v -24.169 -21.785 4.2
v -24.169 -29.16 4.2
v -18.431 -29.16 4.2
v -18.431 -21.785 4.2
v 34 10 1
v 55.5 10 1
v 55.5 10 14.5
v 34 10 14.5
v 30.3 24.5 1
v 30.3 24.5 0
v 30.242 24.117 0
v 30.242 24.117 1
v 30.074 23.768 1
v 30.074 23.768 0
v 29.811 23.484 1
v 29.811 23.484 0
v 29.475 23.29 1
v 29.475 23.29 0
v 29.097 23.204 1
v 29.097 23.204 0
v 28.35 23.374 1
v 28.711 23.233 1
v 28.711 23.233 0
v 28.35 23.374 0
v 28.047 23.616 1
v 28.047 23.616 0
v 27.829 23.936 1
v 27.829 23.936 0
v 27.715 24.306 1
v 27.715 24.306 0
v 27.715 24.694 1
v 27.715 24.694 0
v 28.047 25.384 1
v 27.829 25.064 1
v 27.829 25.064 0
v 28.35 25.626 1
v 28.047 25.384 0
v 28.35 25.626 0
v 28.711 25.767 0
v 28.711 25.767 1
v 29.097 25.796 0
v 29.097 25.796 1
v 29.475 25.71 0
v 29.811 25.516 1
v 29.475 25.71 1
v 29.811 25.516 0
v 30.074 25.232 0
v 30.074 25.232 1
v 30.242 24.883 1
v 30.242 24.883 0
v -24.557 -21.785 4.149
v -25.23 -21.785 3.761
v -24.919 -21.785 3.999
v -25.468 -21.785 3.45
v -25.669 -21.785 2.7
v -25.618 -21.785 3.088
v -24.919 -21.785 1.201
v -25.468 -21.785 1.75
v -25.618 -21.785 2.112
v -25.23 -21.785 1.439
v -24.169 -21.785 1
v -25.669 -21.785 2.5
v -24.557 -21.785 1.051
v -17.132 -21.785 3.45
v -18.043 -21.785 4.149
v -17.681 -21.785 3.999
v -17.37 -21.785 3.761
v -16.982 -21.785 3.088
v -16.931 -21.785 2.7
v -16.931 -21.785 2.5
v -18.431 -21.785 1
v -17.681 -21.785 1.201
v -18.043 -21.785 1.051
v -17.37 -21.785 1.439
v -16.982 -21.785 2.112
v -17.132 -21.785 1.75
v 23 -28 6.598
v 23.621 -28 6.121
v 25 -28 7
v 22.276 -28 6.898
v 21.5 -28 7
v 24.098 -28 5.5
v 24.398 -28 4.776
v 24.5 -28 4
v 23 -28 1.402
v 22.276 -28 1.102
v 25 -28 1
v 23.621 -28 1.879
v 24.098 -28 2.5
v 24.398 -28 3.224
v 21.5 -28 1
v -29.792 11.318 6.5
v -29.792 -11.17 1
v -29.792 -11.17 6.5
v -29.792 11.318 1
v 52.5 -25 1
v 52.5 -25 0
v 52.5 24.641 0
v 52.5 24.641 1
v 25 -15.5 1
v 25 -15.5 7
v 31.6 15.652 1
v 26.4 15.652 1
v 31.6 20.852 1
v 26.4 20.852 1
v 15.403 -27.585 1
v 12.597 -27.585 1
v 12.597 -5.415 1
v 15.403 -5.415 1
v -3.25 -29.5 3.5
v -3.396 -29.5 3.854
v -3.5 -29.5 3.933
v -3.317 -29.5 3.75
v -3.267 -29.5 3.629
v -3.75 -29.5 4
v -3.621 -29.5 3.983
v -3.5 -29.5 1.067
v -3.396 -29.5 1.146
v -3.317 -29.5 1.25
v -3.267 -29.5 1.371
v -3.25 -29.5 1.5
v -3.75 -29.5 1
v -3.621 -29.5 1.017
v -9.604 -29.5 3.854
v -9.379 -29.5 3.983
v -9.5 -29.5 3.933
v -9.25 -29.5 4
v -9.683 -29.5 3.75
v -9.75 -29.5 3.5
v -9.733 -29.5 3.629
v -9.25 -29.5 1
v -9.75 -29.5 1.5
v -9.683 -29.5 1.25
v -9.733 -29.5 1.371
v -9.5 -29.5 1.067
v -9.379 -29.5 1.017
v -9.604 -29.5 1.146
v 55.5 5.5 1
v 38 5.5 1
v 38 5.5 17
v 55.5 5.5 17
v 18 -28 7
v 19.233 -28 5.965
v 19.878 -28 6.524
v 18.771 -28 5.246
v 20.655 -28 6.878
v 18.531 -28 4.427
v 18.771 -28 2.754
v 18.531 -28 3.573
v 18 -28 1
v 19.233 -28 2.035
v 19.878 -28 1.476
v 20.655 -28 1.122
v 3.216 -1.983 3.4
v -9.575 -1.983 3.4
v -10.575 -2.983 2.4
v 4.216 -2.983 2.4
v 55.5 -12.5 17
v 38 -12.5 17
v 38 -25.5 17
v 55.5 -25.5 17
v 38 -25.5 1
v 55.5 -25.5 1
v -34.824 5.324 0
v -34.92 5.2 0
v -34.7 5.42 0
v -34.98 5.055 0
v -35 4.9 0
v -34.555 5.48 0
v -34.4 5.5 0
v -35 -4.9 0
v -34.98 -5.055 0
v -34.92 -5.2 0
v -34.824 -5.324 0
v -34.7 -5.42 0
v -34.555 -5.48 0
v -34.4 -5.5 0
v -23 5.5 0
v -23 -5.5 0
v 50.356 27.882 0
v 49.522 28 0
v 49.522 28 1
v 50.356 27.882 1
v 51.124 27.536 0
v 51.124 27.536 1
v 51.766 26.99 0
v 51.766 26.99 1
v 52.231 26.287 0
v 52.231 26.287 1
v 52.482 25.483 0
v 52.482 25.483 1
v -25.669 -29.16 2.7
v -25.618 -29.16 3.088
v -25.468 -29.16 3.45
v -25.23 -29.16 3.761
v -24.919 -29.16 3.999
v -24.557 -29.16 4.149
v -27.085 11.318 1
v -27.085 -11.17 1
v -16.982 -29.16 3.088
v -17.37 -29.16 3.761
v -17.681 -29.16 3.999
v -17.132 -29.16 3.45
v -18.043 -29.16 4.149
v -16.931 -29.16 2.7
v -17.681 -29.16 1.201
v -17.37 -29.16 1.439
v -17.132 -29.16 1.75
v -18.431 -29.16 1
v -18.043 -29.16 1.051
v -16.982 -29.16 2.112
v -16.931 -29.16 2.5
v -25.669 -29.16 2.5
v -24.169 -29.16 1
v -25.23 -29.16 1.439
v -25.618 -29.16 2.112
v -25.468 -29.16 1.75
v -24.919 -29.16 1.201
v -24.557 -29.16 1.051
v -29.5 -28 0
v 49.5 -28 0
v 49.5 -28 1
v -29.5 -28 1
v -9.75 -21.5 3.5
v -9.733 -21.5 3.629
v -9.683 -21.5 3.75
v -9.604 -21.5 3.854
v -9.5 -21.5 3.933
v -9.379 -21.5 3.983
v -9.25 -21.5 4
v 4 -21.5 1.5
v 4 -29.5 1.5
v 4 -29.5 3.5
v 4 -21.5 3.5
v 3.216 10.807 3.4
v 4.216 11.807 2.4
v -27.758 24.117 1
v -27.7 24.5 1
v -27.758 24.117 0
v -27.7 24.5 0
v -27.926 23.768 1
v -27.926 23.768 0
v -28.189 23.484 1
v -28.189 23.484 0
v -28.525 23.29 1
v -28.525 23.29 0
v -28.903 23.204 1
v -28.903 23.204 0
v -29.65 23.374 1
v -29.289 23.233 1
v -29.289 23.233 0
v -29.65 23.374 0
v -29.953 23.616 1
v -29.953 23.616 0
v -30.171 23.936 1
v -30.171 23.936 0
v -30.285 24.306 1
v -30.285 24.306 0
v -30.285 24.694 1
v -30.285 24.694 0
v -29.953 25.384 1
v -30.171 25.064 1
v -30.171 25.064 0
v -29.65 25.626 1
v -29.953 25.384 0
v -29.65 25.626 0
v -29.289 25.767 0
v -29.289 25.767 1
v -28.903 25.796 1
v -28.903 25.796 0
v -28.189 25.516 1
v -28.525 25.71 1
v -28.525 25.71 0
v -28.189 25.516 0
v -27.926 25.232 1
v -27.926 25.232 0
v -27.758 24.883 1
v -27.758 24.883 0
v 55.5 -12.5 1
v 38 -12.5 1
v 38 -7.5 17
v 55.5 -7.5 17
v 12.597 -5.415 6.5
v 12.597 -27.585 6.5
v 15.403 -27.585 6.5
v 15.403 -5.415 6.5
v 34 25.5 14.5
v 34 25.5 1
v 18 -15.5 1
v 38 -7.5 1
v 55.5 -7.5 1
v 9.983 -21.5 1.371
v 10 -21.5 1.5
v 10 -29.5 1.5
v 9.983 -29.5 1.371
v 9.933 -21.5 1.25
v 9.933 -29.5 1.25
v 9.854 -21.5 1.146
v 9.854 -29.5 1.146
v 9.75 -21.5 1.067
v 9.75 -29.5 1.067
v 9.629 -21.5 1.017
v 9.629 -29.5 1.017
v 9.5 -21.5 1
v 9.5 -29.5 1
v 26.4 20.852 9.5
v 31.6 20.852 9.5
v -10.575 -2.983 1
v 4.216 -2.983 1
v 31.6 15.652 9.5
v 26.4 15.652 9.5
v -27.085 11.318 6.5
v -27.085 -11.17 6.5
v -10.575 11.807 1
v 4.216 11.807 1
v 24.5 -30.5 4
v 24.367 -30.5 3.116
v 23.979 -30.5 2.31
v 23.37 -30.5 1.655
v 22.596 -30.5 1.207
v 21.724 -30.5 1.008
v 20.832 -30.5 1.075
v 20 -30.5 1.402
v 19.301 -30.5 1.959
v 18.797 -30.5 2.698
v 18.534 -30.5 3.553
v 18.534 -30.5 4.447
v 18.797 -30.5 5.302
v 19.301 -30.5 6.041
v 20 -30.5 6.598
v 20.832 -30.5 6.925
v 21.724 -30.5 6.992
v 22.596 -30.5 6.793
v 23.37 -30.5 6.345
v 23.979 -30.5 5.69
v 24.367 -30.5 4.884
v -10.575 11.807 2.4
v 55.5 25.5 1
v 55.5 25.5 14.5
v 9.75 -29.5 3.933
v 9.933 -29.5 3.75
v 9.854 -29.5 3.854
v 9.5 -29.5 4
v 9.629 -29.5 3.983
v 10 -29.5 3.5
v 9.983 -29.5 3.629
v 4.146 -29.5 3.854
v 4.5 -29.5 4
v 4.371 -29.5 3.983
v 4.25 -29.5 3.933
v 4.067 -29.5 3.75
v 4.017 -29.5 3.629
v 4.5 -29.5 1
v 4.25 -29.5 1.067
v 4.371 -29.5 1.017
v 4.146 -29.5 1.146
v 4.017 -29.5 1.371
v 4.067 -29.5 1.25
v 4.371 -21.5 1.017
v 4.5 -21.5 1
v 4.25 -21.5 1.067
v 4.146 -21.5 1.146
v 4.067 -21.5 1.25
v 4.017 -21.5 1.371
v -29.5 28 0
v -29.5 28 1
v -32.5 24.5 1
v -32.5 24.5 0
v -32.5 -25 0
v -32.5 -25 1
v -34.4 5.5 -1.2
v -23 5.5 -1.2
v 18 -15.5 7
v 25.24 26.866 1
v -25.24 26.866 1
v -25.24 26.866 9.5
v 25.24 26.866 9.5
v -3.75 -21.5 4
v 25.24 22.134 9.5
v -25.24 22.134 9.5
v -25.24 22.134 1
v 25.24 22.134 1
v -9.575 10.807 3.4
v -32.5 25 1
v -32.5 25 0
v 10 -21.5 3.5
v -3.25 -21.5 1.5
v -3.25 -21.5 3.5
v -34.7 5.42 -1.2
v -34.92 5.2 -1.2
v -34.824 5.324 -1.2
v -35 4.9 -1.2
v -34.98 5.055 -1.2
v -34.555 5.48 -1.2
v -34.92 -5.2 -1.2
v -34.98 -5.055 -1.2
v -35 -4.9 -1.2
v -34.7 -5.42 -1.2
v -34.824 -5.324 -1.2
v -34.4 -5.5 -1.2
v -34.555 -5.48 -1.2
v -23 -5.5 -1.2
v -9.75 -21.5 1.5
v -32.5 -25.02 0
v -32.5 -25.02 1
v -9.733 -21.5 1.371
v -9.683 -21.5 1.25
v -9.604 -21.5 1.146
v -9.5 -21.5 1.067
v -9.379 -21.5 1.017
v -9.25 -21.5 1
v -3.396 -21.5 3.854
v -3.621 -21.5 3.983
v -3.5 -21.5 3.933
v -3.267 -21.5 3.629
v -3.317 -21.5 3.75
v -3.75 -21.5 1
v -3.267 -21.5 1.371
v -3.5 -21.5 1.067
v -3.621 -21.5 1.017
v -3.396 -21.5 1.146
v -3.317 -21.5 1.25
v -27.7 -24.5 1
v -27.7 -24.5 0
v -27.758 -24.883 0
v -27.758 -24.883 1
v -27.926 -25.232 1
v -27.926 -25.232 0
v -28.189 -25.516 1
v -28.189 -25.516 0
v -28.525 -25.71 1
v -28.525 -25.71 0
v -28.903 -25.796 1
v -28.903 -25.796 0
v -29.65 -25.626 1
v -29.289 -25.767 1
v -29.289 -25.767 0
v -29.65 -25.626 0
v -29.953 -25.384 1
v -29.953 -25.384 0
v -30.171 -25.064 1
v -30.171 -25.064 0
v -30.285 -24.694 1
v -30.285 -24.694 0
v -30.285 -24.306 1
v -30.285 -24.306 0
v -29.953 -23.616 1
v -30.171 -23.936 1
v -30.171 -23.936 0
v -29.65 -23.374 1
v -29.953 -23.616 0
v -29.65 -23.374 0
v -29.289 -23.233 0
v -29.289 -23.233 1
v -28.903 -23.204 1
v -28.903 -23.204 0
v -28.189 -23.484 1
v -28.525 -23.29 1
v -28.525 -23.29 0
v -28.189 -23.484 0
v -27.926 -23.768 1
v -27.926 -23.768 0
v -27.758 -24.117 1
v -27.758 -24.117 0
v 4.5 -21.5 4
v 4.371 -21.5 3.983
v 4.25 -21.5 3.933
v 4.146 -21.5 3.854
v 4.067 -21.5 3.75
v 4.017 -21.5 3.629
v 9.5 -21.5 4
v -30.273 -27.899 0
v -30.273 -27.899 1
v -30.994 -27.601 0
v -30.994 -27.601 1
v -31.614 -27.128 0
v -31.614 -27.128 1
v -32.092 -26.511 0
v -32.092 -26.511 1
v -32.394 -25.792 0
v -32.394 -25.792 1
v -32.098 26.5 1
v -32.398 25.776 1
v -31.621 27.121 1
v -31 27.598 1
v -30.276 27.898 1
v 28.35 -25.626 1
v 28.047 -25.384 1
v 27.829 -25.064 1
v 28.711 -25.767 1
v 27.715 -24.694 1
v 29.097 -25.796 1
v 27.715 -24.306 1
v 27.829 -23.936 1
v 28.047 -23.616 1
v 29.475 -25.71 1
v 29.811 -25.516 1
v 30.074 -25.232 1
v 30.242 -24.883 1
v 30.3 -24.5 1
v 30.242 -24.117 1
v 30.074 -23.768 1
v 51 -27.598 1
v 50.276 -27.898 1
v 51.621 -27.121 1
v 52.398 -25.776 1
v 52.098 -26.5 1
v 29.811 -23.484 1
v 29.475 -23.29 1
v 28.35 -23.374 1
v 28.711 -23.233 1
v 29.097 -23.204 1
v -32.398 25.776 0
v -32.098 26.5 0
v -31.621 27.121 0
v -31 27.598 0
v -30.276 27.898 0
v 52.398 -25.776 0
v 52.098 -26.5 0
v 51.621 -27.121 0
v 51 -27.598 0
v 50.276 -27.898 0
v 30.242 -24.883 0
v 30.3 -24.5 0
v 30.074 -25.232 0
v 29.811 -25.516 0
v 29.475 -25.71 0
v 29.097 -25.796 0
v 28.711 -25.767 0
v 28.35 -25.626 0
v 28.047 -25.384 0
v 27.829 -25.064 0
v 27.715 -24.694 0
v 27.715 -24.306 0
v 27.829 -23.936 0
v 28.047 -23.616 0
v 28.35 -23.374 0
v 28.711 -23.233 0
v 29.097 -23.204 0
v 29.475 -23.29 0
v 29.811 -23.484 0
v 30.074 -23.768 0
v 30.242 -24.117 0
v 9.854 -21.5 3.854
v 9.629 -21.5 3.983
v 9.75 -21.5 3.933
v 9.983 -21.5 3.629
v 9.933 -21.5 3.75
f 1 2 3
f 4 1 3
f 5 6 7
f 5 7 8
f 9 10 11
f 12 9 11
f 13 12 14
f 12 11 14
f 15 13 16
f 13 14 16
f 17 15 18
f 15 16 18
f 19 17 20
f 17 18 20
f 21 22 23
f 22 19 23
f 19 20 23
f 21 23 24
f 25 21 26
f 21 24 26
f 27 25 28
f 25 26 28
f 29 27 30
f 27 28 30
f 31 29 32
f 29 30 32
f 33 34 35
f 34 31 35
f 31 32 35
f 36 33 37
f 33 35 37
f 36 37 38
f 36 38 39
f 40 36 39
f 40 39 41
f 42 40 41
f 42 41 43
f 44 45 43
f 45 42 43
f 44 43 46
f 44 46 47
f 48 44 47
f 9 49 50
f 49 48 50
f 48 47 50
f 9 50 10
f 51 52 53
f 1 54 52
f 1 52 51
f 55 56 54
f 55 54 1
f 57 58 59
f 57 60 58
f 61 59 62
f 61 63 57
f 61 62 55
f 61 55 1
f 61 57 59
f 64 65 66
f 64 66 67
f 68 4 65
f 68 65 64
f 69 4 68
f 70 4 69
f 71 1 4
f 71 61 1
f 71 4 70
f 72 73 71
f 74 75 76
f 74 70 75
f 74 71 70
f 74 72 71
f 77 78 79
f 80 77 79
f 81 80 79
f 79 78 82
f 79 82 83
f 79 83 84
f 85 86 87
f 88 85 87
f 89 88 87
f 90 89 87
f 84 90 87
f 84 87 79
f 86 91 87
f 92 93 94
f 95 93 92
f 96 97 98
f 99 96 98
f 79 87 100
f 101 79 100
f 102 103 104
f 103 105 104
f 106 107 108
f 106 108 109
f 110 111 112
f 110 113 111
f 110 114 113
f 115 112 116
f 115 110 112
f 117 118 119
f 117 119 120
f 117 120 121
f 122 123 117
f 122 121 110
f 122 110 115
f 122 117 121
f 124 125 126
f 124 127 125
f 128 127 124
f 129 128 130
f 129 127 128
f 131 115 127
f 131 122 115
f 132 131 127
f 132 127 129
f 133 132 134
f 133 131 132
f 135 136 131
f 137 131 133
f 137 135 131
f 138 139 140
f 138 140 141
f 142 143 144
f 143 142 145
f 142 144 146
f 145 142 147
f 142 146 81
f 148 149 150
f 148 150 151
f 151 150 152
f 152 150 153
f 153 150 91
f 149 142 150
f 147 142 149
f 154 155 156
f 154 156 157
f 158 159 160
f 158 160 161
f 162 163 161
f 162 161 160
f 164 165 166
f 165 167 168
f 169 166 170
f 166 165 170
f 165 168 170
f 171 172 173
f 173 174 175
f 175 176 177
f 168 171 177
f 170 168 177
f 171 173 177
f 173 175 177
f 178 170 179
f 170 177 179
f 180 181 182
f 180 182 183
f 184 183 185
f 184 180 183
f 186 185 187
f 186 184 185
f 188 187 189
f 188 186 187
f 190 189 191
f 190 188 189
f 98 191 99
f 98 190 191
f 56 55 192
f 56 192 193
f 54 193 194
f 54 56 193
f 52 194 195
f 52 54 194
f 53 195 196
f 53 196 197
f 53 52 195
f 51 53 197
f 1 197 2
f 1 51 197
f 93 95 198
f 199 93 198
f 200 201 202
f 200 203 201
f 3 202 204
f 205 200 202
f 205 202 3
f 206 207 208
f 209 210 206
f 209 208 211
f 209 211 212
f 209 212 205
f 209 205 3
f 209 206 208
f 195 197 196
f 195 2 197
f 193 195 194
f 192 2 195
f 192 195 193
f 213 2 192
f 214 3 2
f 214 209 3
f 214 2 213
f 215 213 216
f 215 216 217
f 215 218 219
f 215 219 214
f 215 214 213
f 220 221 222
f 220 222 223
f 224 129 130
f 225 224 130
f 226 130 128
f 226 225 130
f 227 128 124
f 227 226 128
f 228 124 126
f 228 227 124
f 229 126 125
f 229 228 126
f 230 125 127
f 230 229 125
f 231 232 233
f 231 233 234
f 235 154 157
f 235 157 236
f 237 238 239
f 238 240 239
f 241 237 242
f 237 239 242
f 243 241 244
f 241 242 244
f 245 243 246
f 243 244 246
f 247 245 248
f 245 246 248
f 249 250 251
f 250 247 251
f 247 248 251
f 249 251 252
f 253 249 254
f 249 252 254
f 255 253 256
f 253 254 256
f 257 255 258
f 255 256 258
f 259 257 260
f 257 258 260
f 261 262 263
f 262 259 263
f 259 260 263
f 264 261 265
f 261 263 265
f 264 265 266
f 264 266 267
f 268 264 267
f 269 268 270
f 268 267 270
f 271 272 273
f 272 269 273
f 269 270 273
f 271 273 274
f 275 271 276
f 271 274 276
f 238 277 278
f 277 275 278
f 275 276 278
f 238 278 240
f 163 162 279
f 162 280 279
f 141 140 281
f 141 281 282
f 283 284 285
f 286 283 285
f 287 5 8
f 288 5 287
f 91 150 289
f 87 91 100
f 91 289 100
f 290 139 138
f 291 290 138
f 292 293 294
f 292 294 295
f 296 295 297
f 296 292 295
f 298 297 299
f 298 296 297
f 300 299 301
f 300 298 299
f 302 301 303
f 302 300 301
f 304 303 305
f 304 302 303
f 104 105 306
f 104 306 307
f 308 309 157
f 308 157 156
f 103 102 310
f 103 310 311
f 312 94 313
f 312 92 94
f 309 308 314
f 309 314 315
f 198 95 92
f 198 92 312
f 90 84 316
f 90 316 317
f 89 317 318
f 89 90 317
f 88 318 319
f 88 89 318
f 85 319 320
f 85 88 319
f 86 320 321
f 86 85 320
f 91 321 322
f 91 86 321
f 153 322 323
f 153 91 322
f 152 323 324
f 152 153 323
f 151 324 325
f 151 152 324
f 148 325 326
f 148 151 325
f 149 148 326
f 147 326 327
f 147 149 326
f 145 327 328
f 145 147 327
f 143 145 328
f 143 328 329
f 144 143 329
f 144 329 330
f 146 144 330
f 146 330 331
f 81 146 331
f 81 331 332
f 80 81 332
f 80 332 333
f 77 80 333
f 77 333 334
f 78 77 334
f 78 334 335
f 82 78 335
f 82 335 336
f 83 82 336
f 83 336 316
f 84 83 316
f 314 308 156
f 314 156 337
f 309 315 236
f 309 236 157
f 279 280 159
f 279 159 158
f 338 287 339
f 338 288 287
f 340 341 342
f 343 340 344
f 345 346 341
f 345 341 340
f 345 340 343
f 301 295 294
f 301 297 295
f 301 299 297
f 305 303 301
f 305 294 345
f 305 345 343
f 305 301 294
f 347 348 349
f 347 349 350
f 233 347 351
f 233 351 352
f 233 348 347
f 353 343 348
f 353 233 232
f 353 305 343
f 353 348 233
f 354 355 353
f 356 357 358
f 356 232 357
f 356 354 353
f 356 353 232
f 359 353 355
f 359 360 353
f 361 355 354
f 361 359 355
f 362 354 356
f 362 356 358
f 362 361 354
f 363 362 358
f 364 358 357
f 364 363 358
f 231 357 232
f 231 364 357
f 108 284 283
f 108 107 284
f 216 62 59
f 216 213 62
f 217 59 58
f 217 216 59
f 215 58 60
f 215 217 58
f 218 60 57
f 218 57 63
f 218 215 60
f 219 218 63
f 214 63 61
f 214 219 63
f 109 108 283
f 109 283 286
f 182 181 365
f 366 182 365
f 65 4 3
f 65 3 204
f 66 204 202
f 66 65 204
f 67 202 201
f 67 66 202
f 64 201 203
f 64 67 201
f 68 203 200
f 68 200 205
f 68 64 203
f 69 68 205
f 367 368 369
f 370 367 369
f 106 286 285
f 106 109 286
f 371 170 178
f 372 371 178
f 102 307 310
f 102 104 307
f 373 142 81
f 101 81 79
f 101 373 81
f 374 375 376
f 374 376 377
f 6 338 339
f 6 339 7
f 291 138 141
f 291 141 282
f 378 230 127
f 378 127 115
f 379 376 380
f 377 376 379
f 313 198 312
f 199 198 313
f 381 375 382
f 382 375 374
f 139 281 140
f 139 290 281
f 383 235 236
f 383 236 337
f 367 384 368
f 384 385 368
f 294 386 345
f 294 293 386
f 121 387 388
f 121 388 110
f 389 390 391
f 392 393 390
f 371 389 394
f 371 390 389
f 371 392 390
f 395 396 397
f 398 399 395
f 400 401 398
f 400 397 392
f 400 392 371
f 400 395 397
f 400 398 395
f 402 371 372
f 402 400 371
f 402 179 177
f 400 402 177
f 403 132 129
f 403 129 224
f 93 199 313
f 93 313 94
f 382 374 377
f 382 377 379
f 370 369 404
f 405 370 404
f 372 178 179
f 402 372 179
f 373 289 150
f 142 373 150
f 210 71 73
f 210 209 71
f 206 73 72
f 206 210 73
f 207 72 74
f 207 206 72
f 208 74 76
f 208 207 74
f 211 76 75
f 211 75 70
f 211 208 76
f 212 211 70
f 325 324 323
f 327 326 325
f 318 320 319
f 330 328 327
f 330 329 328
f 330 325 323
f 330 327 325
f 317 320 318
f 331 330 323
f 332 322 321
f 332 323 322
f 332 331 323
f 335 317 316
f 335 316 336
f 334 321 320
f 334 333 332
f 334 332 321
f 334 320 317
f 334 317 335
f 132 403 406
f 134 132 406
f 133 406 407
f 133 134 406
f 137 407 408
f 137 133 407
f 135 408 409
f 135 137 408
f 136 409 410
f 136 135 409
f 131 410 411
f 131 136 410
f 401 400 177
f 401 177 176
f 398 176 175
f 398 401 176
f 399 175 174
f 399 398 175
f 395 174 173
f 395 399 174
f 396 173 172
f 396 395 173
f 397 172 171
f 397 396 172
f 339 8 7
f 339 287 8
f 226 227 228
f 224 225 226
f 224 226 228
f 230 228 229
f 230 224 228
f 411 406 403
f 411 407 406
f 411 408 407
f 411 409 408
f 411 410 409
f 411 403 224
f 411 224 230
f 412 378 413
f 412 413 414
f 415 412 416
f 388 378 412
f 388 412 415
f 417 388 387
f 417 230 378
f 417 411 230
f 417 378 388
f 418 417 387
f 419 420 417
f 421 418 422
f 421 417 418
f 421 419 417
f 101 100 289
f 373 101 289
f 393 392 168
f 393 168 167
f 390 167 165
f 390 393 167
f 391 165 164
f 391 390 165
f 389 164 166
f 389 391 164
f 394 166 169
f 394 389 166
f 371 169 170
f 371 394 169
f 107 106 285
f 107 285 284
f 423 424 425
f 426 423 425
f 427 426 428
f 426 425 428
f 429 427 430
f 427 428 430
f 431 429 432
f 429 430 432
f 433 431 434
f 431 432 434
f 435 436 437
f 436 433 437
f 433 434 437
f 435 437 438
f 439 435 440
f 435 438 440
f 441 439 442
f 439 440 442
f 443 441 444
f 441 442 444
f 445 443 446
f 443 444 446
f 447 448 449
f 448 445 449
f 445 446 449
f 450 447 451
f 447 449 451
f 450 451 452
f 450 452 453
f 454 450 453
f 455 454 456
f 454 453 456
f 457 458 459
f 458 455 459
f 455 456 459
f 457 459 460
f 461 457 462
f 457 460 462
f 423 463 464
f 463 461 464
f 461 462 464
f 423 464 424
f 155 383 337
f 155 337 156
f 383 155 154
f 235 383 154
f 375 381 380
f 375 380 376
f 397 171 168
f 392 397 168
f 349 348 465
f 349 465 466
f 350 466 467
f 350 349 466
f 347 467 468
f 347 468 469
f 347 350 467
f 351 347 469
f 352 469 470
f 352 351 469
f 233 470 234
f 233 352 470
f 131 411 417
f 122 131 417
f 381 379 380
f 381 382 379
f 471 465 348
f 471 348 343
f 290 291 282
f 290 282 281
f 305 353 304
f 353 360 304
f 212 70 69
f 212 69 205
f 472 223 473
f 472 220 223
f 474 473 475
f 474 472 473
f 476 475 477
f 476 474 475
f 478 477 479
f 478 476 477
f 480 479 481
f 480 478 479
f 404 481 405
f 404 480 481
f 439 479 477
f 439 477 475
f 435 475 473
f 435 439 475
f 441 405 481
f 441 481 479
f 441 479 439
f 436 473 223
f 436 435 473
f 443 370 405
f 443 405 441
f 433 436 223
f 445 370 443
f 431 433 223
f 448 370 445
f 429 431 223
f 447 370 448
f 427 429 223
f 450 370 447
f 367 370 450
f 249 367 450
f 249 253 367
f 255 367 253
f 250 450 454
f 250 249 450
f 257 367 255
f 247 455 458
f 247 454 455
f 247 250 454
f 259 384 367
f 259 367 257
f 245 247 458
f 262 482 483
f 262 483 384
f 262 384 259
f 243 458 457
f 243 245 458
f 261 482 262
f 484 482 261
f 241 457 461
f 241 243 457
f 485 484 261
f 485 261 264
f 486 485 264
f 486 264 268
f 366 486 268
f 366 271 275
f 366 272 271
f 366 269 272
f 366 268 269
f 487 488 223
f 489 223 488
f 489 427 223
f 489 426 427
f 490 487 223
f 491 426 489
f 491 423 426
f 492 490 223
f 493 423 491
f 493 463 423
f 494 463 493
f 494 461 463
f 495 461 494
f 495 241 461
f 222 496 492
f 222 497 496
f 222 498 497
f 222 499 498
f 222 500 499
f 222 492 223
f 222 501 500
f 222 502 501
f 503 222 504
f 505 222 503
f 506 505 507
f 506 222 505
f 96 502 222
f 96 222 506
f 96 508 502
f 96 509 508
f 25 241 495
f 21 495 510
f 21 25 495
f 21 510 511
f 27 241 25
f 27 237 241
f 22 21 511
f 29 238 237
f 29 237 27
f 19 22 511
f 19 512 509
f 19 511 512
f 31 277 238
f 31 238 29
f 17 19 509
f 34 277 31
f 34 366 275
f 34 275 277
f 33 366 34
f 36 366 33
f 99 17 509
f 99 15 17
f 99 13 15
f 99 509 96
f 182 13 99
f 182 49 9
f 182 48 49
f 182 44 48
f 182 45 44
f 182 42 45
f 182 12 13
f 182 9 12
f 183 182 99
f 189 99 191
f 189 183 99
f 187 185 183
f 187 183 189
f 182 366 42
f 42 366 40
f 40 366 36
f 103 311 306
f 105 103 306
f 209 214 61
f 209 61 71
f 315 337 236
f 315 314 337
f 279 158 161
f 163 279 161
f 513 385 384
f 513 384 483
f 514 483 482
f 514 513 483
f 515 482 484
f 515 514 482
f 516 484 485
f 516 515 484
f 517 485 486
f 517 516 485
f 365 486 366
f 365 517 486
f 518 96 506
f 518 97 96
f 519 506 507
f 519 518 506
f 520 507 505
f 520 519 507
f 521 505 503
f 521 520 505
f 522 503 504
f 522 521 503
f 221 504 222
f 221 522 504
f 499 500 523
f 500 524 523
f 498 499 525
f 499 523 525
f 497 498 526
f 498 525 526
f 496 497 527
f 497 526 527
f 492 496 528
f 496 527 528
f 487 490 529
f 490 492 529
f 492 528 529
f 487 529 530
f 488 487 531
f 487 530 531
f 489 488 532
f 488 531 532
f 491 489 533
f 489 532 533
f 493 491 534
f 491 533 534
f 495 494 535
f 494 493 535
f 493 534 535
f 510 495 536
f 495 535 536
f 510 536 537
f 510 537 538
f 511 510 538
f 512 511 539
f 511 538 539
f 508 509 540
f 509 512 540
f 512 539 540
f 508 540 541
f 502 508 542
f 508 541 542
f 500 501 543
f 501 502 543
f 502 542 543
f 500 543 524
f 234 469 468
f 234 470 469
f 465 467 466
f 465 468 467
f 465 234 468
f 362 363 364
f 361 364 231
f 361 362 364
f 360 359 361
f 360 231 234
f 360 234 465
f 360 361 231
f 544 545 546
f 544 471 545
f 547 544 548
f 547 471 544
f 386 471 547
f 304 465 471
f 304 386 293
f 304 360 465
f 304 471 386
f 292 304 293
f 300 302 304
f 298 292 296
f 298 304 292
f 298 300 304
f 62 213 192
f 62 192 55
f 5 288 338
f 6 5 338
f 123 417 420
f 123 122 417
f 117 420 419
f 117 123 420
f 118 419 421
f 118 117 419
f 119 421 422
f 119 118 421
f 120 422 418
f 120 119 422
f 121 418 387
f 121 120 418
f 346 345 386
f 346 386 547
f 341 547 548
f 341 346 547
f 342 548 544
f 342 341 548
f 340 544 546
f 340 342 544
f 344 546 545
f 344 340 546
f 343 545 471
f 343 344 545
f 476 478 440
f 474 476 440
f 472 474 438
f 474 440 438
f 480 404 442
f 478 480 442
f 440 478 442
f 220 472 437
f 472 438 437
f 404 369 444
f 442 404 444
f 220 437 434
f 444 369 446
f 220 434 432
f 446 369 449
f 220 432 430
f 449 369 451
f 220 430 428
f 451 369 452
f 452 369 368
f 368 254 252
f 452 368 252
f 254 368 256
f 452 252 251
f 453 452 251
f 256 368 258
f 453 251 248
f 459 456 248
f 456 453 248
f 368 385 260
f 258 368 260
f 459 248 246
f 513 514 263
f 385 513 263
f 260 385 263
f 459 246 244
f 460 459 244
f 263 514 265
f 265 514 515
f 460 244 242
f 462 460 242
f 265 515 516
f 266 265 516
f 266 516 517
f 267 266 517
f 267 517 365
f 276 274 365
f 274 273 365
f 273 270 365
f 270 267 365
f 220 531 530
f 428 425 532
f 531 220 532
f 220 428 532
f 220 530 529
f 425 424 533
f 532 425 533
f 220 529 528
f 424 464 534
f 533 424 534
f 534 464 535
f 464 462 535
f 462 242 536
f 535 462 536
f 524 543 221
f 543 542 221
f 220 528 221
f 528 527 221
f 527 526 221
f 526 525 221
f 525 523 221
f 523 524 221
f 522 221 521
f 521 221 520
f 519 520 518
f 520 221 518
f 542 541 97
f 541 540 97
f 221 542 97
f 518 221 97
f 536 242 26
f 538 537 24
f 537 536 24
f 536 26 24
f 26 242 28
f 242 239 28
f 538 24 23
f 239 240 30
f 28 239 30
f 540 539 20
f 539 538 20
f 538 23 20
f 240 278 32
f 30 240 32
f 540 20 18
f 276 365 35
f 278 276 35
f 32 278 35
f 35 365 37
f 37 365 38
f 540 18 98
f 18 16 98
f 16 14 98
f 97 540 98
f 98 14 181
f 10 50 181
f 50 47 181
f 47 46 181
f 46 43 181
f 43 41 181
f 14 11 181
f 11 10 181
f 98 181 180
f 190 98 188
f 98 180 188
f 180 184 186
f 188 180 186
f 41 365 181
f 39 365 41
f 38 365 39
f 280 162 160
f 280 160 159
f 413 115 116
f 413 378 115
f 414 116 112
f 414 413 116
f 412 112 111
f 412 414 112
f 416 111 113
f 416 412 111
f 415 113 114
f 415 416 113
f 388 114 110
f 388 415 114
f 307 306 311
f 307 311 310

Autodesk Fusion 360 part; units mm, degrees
sketch "Skizze4" plane through (0, 0, 0) normal (0, 0, 1) x (1, 0, 0)
  line L0 (52.4999, -25) -> (52.4999, 24.6406)
  line L1 (-32.5, 24.5) -> (-32.5, -25.0196)
  line L2 (49.5215, 28) -> (-29.5, 28)
  line L3 (-32.5, 25) -> (-32.5, 24.5)
  line L4 (49.4999, -28) -> (-29.5, -28)
  line L5 (-32.5, -25) -> (-32.5, -25.0196)
  circle A0 centre (29, 24.5) radius 1.3
  circle A1 centre (29, -24.5) radius 1.3
  circle A2 centre (-29, -24.5) radius 1.3
  circle A3 centre (-29, 24.5) radius 1.3
  arc A4 (-29.5, 28) -> (-32.5, 25) centre (-29.5, 25) ccw
  arc A5 (-32.5, -25) -> (-29.5, -28) centre (-29.5, -25) ccw
  arc A6 (49.4999, -28) -> (52.4999, -25) centre (49.4999, -25) ccw
  arc A7 (52.4999, 24.6406) -> (49.5215, 28) centre (49.5215, 25) ccw
  line L6 (-29, 24.5) -> (29, -24.5) construction
  line L7 (29, 24.5) -> (-29, -24.5) construction
  line L8 (-29, 24.5) -> (-29, -24.5) construction
  line L9 (-29, -24.5) -> (29, -24.5) construction
  line L10 (29, -24.5) -> (29, 24.5) construction
  line L11 (-29, 24.5) -> (29, 24.5) construction
  point P0 (-32.5, 28)
  dimension "d3" = 85
  dimension "d6" = 3.5
  dimension "d11" = 2.6
  dimension "d17" = 3
  dimension "d57" = 49
  dimension "d58" = 58
  dimension "d61" = 56
  dimension "d62" = 3.5
  dimension "d63" = 3.5
extrude "Extrusion7" add sketch "Skizze4" along normal blind 1 makes body 1
copy_body "Körper->Berechn3" bodies 1 removing the originals makes body 2 in component "Baseplate"
sketch "Skizze9" plane through (0, 0, 1) normal (0, 0, 1) x (1, 0, 0)
  arc A0 (52.4999, 24.6406) -> (49.5215, 28) centre (49.5215, 25) ccw
  line L0 (52.4999, -25) -> (52.4999, 24.6406) construction
  line L1 (49.5215, 28) -> (-29.5, 28) construction
  arc A1 (49.4999, -28) -> (52.4999, -25) centre (49.4999, -25) ccw construction
  line L2 (49.4999, -28) -> (-29.5, -28) construction
  circle A2 centre (29, -24.5) radius 1.3
  arc A3 (-29.5, 28) -> (-32.5, 25) centre (-29.5, 25) ccw construction
  line L3 (-32.5, 24.5) -> (-32.5, -25.0196) construction
  arc A4 (-32.5, -25) -> (-29.5, -28) centre (-29.5, -25) ccw construction
  circle A5 centre (29, 24.5) radius 1.3
  circle A6 centre (-29, 24.5) radius 1.3
  circle A7 centre (-29, -24.5) radius 1.3
  line L4 (-32.5, 25) -> (-32.5, 24.5) construction
  circle A8 centre (29, -24.5) radius 1.3
  circle A9 centre (29, 24.5) radius 1.3
  circle A10 centre (-29, -24.5) radius 1.3
  circle A11 centre (-29, 24.5) radius 1.3
  arc A12 (49.4999, -28) -> (52.4999, -25) centre (49.4999, -25) ccw
  line L5 (52.4999, -25) -> (52.4999, 24.6406)
  arc A13 (52.4999, 24.6406) -> (49.5215, 28) centre (49.5215, 25) ccw
  line L6 (49.5215, 28) -> (-29.5, 28)
  arc A14 (-29.5, 28) -> (-32.5, 25) centre (-29.5, 25) ccw
  line L7 (-32.5, 25) -> (-32.5, -25)
  arc A15 (-32.5, -25) -> (-29.5, -28) centre (-29.5, -25) ccw
  line L8 (-29.5, -28) -> (49.4999, -28)
  line L9 (-16.9308, -29.1603) -> (-25.6692, -29.1603)
  line L10 (-25.6692, -29.1603) -> (-25.6692, -21.785)
  line L11 (-25.6692, -21.785) -> (-16.9308, -21.785)
  line L12 (-16.9308, -21.785) -> (-16.9308, -29.1603)
  line L13 (-16.9308, -29.1603) -> (-25.6692, -21.785) construction
  line L14 (-25.6692, -29.1603) -> (-16.9308, -21.785) construction
  line L15 (-3.25, -29.5) -> (-9.75, -29.5)
  line L16 (-9.75, -29.5) -> (-9.75, -21.5)
  line L17 (-9.75, -21.5) -> (-3.25, -21.5)
  line L18 (-3.25, -21.5) -> (-3.25, -29.5)
  line L19 (-3.25, -29.5) -> (-9.75, -21.5) construction
  line L20 (-9.75, -29.5) -> (-3.25, -21.5) construction
  line L21 (10, -29.5) -> (4, -29.5)
  line L22 (4, -29.5) -> (4, -21.5)
  line L23 (4, -21.5) -> (10, -21.5)
  line L24 (10, -21.5) -> (10, -29.5)
  line L25 (10, -29.5) -> (4, -21.5) construction
  line L26 (4, -29.5) -> (10, -21.5) construction
  line L27 (18, -28) -> (25, -28)
  line L28 (25, -28) -> (25, -15.5)
  line L29 (25, -15.5) -> (18, -15.5)
  line L30 (18, -15.5) -> (18, -28)
  line L31 (18, -28) -> (25, -15.5) construction
  line L32 (25, -28) -> (18, -15.5) construction
  line L33 (55.4999, -25.5) -> (37.9999, -25.5)
  line L34 (37.9999, -25.5) -> (37.9999, -12.5)
  line L35 (37.9999, -12.5) -> (55.4999, -12.5)
  line L36 (55.4999, -12.5) -> (55.4999, -25.5)
  line L37 (55.4999, -25.5) -> (37.9999, -12.5) construction
  line L38 (37.9999, -25.5) -> (55.4999, -12.5) construction
  line L39 (55.4999, -7.5) -> (37.9999, -7.5)
  line L40 (37.9999, -7.5) -> (37.9999, 5.5)
  line L41 (37.9999, 5.5) -> (55.4999, 5.5)
  line L42 (55.4999, 5.5) -> (55.4999, -7.5)
  line L43 (55.4999, -7.5) -> (37.9999, 5.5) construction
  line L44 (37.9999, -7.5) -> (55.4999, 5.5) construction
  line L45 (55.4999, 10) -> (33.9999, 10)
  line L46 (33.9999, 10) -> (33.9999, 25.5)
  line L47 (33.9999, 25.5) -> (55.4999, 25.5)
  line L48 (55.4999, 25.5) -> (55.4999, 10)
  line L49 (55.4999, 10) -> (33.9999, 25.5) construction
  line L50 (33.9999, 10) -> (55.4999, 25.5) construction
  line L51 (25.2404, 22.1337) -> (-25.2404, 22.1337)
  line L52 (-25.2404, 22.1337) -> (-25.2404, 26.8663)
  line L53 (-25.2404, 26.8663) -> (25.2404, 26.8663)
  line L54 (25.2404, 26.8663) -> (25.2404, 22.1337)
  line L55 (25.2404, 22.1337) -> (-25.2404, 26.8663) construction
  line L56 (-25.2404, 22.1337) -> (25.2404, 26.8663) construction
  line L57 (-29, 24.5) -> (29, 24.5) construction
  line L58 (-27.0854, -11.1703) -> (-29.7923, -11.1703)
  line L59 (-29.7923, -11.1703) -> (-29.7923, 11.318)
  line L60 (-29.7923, 11.318) -> (-27.0854, 11.318)
  line L61 (-27.0854, 11.318) -> (-27.0854, -11.1703)
  line L62 (-27.0854, -11.1703) -> (-29.7923, 11.318) construction
  line L63 (-29.7923, -11.1703) -> (-27.0854, 11.318) construction
  line L64 (4.2156, -2.9834) -> (-10.5748, -2.9834)
  line L65 (-10.5748, -2.9834) -> (-10.5748, 11.807)
  line L66 (-10.5748, 11.807) -> (4.2156, 11.807)
  line L67 (4.2156, 11.807) -> (4.2156, -2.9834)
  line L68 (4.2156, -2.9834) -> (-10.5748, 11.807) construction
  line L69 (-10.5748, -2.9834) -> (4.2156, 11.807) construction
  line L70 (15.4032, -27.5854) -> (12.5968, -27.5854)
  line L71 (12.5968, -27.5854) -> (12.5968, -5.4146)
  line L72 (12.5968, -5.4146) -> (15.4032, -5.4146)
  line L73 (15.4032, -5.4146) -> (15.4032, -27.5854)
  line L74 (15.4032, -27.5854) -> (12.5968, -5.4146) construction
  line L75 (12.5968, -27.5854) -> (15.4032, -5.4146) construction
  line L76 (-16.614, -8.6626) -> (-24.2715, -8.6626)
  line L77 (-24.2715, -8.6626) -> (-24.2715, -6.5905)
  line L78 (-24.2715, -6.5905) -> (-16.614, -6.5905)
  line L79 (-16.614, -6.5905) -> (-16.614, -8.6626)
  line L80 (-16.614, -8.6626) -> (-24.2715, -6.5905) construction
  line L81 (-24.2715, -8.6626) -> (-16.614, -6.5905) construction
  line L82 (-3.25, -29.5) -> (4, -29.5) construction
  line L83 (-3.25, -21.5) -> (4, -21.5) construction
  line L84 (55.4999, -12.5) -> (55.4999, -7.5) construction
  line L85 (55.4999, 5.5) -> (55.4999, 10) construction
  line L86 (31.6, 15.6523) -> (26.4, 15.6523)
  line L87 (26.4, 15.6523) -> (26.4, 20.8523)
  line L88 (26.4, 20.8523) -> (31.6, 20.8523)
  line L89 (31.6, 20.8523) -> (31.6, 15.6523)
  line L90 (31.6, 15.6523) -> (26.4, 20.8523) construction
  line L91 (26.4, 15.6523) -> (31.6, 20.8523) construction
  point P0 (-21.3, -25.4727)
  point P1 (-6.5, -25.5)
  point P2 (7, -25.5)
  point P3 (21.5, -21.75)
  point P4 (46.7499, -19)
  point P5 (46.7499, -1)
  point P6 (44.7499, 17.75)
  point P7 (0, 24.5)
  point P8 (-28.4388, 0.0739)
  point P9 (-3.1796, 4.4118)
  point P10 (14, -16.5)
  point P11 (-20.4428, -7.6266)
  point P12 (29, 18.2523)
  dimension "d66" = 9
  dimension "d67" = 27
  dimension "d68" = 45.75
  dimension "d69" = 29
  dimension "d70" = 7.7
  dimension "d71" = 14.8
  dimension "d72" = 13.5
  dimension "d73" = 6.5
  dimension "d74" = 6
  dimension "d75" = 8
  dimension "d76" = 17.5
  dimension "d77" = 13
  dimension "d78" = 1.5
  dimension "d79" = 12.5
  dimension "d80" = 7
  dimension "d82" = 7
  dimension "d84" = 7.5
  dimension "d85" = 3
  dimension "d86" = 21.5
  dimension "d87" = 15.5
  dimension "d88" = 5.2
  dimension "d89" = 5.2
  dimension "d90" = 11.5
  dimension "d91" = 17.5
  dimension "d92" = 13
extrude "Extrusion8" add sketch "Skizze9" along normal blind 3.2 separate body contours L8 L10 L11 L12 | L8 L9 L10 L12 makes body 3
extrude "Extrusion9" add sketch "Skizze9" along normal blind 3 separate body contours L8 L16 L17 L18 | L8 L15 L16 L18 | L8 L21 L22 L24 | L8 L22 L23 L24 makes body 4 at (-7.5833, -26.8333, 1) makes body 5 at (6, -24.1667, 1)
extrude "Extrusion10" add sketch "Skizze9" along normal blind 5.5 separate body contours L58 L59 L60 L61 | L70 L71 L72 L73 makes body 6 at (12.5968, -20.1951, 2.8333) makes body 7 at (-29.7923, -3.6742, 2.8333)
extrude "Extrusion11" add sketch "Skizze9" along normal blind 6 separate body contours L8 L27 L28 L29 L30 makes body 8
extrude "Extrusion12" add sketch "Skizze9" along normal blind 16 separate body contours L5 L39 L41 L42 | L5 L39 L40 L41 | A12 L5 L33 L35 L36 | A12 L5 L33 L34 L35 makes body 9 at (43.8332, -12.5, 6.3333) makes body 10 at (43.8332, 5.5, 6.3333)
extrude "Extrusion13" add sketch "Skizze9" along normal blind 13.5 separate body contours A0 L5 A13 L45 L46 L47 | A0 L5 A13 L45 L47 L48 makes body 11
extrude "Extrusion14" add sketch "Skizze9" along normal blind 8.5 separate body contours L51 L52 L53 L54 | L86 L87 L88 L89 makes body 12 at (8.4135, 22.1337, 3.8333) makes body 13 at (26.4, 17.3856, 3.8333)
extrude "Extrusion15" add sketch "Skizze9" along normal blind 2.4 separate body contours L64 L65 L66 L67 makes body 14
sketch "Skizze10" plane through (0, -28, 0) normal (0, -1, 0) x (1, 0, 0)
  line L0 (18, 1) -> (25, 1)
  line L1 (25, 1) -> (25, 7)
  line L2 (25, 7) -> (18, 7)
  line L3 (18, 7) -> (18, 1)
  circle A0 centre (21.5, 4) radius 3
  line L4 (18, 7) -> (25, 1) construction
  line L5 (25, 7) -> (18, 1) construction
extrude "Extrusion16" add sketch "Skizze10" along normal blind 2.5 contours A0 bodies 8
fillet "Abrundung1" radius 1.5 4 edges at (-25.6692, -25.4727, 4.2) (-25.6692, -25.4727, 1) (-16.9308, -25.4727, 4.2) (-16.9308, -25.4727, 1) on bodies 3
chamfer "Fase4" distance 1 angle 45 4 edges at (-10.5748, 4.4118, 3.4) (-3.1796, -2.9834, 3.4) (-3.1796, 11.807, 3.4) (4.2156, 4.4118, 3.4) on bodies 14
fillet "Abrundung2" radius 0.5 8 edges at (-9.75, -25.5, 4) (-3.25, -25.5, 4) (-9.75, -25.5, 1) (-3.25, -25.5, 1) (4, -25.5, 1) (4, -25.5, 4) (10, -25.5, 4) (10, -25.5, 1) on bodies 4 5
copy_body "Körper->Berechn4" bodies 3 removing the originals makes body 15 in component "Power USB C"
copy_body "Körper->Berechn5" bodies 5 removing the originals makes body 16 in component "Micro HDMI 2"
copy_body "Körper->Berechn6" bodies 8 removing the originals makes body 17 in component "3.5 mm Audio"
copy_body "Körper->Berechn7" bodies 4 removing the originals makes body 18 in component "Micro HDMI 1"
copy_body "Körper->Berechn8" bodies 9 removing the originals makes body 19 in component "USB 2.0"
copy_body "Körper->Berechn9" bodies 7 removing the originals makes body 20 in component "Display"
copy_body "Körper->Berechn10" bodies 14 removing the originals makes body 21 in component "Processor"
copy_body "Körper->Berechn11" bodies 11 removing the originals makes body 22 in component "Ethernet "
copy_body "Körper->Berechn12" bodies 6 removing the originals makes body 23 in component "Kamera"
copy_body "Körper->Berechn13" bodies 12 removing the originals makes body 24 in component "GPIO 40"
copy_body "Körper->Berechn14" bodies 10 removing the originals makes body 25 in component "USB 3.0"
copy_body "Körper->Berechn15" bodies 13 removing the originals makes body 26 in component "PoE"
sketch "Skizze11" plane through (0, 0, 0) normal (0, 0, -1) x (1, 0, 0)
  circle A0 centre (29, 24.5) radius 1.3
  circle A1 centre (-29, 24.5) radius 1.3
  circle A2 centre (-29, -24.5) radius 1.3
  circle A3 centre (29, -24.5) radius 1.3
  arc A4 (52.4999, 25) -> (49.4999, 28) centre (49.4999, 25) ccw
  line L0 (49.4999, 28) -> (-29.5, 28)
  arc A5 (-29.5, 28) -> (-32.5, 25) centre (-29.5, 25) ccw
  line L1 (-32.5, 25) -> (-32.5, -25)
  arc A6 (-32.5, -25) -> (-29.5, -28) centre (-29.5, -25) ccw
  line L2 (-29.5, -28) -> (49.5215, -28)
  arc A7 (49.5215, -28) -> (52.4999, -24.6406) centre (49.5215, -25) ccw
  line L3 (52.4999, -24.6406) -> (52.4999, 25)
  line L4 (-29, 24.5) -> (-29, -24.5) construction
  line L5 (-23, 5.5) -> (-35, 5.5)
  line L6 (-35, 5.5) -> (-35, -5.5)
  line L7 (-35, -5.5) -> (-23, -5.5)
  line L8 (-23, -5.5) -> (-23, 5.5)
  line L9 (-23, 5.5) -> (-35, -5.5) construction
  line L10 (-35, 5.5) -> (-23, -5.5) construction
  point P0 (-29, 0)
  dimension "d114" = 11
  dimension "d115" = 12
extrude "Extrusion1" add sketch "Skizze11" along normal blind 1.2 separate body contours L1 L5 L7 L8 | L1 L5 L6 L7 makes body 27 in component "Baseplate"
fillet "Abrundung1'" radius 0.6 2 edges at (-35, 5.5, -0.6) (-35, -5.5, -0.6) on bodies 27 in component "Baseplate"
component "Baseplate" placed x (1, 0, 0) y (0, 1, 0) z (0, 0, 1) at (0, 0, 0)
component "Power USB C" placed x (1, 0, 0) y (0, 1, 0) z (0, 0, 1) at (0, 0, 0)
component "Micro HDMI 2" placed x (1, 0, 0) y (0, 1, 0) z (0, 0, 1) at (0, 0, 0)
component "3.5 mm Audio" placed x (1, 0, 0) y (0, 1, 0) z (0, 0, 1) at (0, 0, 0)
component "Micro HDMI 1" placed x (1, 0, 0) y (0, 1, 0) z (0, 0, 1) at (0, 0, 0)
component "USB 2.0" placed x (1, 0, 0) y (0, 1, 0) z (0, 0, 1) at (0, 0, 0)
component "Display" placed x (1, 0, 0) y (0, 1, 0) z (0, 0, 1) at (0, 0, 0)
component "Processor" placed x (1, 0, 0) y (0, 1, 0) z (0, 0, 1) at (0, 0, 0)
component "Ethernet " placed x (1, 0, 0) y (0, 1, 0) z (0, 0, 1) at (0, 0, 0)
component "Kamera" placed x (1, 0, 0) y (0, 1, 0) z (0, 0, 1) at (0, 0, 0)
component "GPIO 40" placed x (1, 0, 0) y (0, 1, 0) z (0, 0, 1) at (0, 0, 0)
component "USB 3.0" placed x (1, 0, 0) y (0, 1, 0) z (0, 0, 1) at (0, 0, 0)
component "PoE" placed x (1, 0, 0) y (0, 1, 0) z (0, 0, 1) at (0, 0, 0)
equation "d91 = d76"
equation "d92 = d77"
